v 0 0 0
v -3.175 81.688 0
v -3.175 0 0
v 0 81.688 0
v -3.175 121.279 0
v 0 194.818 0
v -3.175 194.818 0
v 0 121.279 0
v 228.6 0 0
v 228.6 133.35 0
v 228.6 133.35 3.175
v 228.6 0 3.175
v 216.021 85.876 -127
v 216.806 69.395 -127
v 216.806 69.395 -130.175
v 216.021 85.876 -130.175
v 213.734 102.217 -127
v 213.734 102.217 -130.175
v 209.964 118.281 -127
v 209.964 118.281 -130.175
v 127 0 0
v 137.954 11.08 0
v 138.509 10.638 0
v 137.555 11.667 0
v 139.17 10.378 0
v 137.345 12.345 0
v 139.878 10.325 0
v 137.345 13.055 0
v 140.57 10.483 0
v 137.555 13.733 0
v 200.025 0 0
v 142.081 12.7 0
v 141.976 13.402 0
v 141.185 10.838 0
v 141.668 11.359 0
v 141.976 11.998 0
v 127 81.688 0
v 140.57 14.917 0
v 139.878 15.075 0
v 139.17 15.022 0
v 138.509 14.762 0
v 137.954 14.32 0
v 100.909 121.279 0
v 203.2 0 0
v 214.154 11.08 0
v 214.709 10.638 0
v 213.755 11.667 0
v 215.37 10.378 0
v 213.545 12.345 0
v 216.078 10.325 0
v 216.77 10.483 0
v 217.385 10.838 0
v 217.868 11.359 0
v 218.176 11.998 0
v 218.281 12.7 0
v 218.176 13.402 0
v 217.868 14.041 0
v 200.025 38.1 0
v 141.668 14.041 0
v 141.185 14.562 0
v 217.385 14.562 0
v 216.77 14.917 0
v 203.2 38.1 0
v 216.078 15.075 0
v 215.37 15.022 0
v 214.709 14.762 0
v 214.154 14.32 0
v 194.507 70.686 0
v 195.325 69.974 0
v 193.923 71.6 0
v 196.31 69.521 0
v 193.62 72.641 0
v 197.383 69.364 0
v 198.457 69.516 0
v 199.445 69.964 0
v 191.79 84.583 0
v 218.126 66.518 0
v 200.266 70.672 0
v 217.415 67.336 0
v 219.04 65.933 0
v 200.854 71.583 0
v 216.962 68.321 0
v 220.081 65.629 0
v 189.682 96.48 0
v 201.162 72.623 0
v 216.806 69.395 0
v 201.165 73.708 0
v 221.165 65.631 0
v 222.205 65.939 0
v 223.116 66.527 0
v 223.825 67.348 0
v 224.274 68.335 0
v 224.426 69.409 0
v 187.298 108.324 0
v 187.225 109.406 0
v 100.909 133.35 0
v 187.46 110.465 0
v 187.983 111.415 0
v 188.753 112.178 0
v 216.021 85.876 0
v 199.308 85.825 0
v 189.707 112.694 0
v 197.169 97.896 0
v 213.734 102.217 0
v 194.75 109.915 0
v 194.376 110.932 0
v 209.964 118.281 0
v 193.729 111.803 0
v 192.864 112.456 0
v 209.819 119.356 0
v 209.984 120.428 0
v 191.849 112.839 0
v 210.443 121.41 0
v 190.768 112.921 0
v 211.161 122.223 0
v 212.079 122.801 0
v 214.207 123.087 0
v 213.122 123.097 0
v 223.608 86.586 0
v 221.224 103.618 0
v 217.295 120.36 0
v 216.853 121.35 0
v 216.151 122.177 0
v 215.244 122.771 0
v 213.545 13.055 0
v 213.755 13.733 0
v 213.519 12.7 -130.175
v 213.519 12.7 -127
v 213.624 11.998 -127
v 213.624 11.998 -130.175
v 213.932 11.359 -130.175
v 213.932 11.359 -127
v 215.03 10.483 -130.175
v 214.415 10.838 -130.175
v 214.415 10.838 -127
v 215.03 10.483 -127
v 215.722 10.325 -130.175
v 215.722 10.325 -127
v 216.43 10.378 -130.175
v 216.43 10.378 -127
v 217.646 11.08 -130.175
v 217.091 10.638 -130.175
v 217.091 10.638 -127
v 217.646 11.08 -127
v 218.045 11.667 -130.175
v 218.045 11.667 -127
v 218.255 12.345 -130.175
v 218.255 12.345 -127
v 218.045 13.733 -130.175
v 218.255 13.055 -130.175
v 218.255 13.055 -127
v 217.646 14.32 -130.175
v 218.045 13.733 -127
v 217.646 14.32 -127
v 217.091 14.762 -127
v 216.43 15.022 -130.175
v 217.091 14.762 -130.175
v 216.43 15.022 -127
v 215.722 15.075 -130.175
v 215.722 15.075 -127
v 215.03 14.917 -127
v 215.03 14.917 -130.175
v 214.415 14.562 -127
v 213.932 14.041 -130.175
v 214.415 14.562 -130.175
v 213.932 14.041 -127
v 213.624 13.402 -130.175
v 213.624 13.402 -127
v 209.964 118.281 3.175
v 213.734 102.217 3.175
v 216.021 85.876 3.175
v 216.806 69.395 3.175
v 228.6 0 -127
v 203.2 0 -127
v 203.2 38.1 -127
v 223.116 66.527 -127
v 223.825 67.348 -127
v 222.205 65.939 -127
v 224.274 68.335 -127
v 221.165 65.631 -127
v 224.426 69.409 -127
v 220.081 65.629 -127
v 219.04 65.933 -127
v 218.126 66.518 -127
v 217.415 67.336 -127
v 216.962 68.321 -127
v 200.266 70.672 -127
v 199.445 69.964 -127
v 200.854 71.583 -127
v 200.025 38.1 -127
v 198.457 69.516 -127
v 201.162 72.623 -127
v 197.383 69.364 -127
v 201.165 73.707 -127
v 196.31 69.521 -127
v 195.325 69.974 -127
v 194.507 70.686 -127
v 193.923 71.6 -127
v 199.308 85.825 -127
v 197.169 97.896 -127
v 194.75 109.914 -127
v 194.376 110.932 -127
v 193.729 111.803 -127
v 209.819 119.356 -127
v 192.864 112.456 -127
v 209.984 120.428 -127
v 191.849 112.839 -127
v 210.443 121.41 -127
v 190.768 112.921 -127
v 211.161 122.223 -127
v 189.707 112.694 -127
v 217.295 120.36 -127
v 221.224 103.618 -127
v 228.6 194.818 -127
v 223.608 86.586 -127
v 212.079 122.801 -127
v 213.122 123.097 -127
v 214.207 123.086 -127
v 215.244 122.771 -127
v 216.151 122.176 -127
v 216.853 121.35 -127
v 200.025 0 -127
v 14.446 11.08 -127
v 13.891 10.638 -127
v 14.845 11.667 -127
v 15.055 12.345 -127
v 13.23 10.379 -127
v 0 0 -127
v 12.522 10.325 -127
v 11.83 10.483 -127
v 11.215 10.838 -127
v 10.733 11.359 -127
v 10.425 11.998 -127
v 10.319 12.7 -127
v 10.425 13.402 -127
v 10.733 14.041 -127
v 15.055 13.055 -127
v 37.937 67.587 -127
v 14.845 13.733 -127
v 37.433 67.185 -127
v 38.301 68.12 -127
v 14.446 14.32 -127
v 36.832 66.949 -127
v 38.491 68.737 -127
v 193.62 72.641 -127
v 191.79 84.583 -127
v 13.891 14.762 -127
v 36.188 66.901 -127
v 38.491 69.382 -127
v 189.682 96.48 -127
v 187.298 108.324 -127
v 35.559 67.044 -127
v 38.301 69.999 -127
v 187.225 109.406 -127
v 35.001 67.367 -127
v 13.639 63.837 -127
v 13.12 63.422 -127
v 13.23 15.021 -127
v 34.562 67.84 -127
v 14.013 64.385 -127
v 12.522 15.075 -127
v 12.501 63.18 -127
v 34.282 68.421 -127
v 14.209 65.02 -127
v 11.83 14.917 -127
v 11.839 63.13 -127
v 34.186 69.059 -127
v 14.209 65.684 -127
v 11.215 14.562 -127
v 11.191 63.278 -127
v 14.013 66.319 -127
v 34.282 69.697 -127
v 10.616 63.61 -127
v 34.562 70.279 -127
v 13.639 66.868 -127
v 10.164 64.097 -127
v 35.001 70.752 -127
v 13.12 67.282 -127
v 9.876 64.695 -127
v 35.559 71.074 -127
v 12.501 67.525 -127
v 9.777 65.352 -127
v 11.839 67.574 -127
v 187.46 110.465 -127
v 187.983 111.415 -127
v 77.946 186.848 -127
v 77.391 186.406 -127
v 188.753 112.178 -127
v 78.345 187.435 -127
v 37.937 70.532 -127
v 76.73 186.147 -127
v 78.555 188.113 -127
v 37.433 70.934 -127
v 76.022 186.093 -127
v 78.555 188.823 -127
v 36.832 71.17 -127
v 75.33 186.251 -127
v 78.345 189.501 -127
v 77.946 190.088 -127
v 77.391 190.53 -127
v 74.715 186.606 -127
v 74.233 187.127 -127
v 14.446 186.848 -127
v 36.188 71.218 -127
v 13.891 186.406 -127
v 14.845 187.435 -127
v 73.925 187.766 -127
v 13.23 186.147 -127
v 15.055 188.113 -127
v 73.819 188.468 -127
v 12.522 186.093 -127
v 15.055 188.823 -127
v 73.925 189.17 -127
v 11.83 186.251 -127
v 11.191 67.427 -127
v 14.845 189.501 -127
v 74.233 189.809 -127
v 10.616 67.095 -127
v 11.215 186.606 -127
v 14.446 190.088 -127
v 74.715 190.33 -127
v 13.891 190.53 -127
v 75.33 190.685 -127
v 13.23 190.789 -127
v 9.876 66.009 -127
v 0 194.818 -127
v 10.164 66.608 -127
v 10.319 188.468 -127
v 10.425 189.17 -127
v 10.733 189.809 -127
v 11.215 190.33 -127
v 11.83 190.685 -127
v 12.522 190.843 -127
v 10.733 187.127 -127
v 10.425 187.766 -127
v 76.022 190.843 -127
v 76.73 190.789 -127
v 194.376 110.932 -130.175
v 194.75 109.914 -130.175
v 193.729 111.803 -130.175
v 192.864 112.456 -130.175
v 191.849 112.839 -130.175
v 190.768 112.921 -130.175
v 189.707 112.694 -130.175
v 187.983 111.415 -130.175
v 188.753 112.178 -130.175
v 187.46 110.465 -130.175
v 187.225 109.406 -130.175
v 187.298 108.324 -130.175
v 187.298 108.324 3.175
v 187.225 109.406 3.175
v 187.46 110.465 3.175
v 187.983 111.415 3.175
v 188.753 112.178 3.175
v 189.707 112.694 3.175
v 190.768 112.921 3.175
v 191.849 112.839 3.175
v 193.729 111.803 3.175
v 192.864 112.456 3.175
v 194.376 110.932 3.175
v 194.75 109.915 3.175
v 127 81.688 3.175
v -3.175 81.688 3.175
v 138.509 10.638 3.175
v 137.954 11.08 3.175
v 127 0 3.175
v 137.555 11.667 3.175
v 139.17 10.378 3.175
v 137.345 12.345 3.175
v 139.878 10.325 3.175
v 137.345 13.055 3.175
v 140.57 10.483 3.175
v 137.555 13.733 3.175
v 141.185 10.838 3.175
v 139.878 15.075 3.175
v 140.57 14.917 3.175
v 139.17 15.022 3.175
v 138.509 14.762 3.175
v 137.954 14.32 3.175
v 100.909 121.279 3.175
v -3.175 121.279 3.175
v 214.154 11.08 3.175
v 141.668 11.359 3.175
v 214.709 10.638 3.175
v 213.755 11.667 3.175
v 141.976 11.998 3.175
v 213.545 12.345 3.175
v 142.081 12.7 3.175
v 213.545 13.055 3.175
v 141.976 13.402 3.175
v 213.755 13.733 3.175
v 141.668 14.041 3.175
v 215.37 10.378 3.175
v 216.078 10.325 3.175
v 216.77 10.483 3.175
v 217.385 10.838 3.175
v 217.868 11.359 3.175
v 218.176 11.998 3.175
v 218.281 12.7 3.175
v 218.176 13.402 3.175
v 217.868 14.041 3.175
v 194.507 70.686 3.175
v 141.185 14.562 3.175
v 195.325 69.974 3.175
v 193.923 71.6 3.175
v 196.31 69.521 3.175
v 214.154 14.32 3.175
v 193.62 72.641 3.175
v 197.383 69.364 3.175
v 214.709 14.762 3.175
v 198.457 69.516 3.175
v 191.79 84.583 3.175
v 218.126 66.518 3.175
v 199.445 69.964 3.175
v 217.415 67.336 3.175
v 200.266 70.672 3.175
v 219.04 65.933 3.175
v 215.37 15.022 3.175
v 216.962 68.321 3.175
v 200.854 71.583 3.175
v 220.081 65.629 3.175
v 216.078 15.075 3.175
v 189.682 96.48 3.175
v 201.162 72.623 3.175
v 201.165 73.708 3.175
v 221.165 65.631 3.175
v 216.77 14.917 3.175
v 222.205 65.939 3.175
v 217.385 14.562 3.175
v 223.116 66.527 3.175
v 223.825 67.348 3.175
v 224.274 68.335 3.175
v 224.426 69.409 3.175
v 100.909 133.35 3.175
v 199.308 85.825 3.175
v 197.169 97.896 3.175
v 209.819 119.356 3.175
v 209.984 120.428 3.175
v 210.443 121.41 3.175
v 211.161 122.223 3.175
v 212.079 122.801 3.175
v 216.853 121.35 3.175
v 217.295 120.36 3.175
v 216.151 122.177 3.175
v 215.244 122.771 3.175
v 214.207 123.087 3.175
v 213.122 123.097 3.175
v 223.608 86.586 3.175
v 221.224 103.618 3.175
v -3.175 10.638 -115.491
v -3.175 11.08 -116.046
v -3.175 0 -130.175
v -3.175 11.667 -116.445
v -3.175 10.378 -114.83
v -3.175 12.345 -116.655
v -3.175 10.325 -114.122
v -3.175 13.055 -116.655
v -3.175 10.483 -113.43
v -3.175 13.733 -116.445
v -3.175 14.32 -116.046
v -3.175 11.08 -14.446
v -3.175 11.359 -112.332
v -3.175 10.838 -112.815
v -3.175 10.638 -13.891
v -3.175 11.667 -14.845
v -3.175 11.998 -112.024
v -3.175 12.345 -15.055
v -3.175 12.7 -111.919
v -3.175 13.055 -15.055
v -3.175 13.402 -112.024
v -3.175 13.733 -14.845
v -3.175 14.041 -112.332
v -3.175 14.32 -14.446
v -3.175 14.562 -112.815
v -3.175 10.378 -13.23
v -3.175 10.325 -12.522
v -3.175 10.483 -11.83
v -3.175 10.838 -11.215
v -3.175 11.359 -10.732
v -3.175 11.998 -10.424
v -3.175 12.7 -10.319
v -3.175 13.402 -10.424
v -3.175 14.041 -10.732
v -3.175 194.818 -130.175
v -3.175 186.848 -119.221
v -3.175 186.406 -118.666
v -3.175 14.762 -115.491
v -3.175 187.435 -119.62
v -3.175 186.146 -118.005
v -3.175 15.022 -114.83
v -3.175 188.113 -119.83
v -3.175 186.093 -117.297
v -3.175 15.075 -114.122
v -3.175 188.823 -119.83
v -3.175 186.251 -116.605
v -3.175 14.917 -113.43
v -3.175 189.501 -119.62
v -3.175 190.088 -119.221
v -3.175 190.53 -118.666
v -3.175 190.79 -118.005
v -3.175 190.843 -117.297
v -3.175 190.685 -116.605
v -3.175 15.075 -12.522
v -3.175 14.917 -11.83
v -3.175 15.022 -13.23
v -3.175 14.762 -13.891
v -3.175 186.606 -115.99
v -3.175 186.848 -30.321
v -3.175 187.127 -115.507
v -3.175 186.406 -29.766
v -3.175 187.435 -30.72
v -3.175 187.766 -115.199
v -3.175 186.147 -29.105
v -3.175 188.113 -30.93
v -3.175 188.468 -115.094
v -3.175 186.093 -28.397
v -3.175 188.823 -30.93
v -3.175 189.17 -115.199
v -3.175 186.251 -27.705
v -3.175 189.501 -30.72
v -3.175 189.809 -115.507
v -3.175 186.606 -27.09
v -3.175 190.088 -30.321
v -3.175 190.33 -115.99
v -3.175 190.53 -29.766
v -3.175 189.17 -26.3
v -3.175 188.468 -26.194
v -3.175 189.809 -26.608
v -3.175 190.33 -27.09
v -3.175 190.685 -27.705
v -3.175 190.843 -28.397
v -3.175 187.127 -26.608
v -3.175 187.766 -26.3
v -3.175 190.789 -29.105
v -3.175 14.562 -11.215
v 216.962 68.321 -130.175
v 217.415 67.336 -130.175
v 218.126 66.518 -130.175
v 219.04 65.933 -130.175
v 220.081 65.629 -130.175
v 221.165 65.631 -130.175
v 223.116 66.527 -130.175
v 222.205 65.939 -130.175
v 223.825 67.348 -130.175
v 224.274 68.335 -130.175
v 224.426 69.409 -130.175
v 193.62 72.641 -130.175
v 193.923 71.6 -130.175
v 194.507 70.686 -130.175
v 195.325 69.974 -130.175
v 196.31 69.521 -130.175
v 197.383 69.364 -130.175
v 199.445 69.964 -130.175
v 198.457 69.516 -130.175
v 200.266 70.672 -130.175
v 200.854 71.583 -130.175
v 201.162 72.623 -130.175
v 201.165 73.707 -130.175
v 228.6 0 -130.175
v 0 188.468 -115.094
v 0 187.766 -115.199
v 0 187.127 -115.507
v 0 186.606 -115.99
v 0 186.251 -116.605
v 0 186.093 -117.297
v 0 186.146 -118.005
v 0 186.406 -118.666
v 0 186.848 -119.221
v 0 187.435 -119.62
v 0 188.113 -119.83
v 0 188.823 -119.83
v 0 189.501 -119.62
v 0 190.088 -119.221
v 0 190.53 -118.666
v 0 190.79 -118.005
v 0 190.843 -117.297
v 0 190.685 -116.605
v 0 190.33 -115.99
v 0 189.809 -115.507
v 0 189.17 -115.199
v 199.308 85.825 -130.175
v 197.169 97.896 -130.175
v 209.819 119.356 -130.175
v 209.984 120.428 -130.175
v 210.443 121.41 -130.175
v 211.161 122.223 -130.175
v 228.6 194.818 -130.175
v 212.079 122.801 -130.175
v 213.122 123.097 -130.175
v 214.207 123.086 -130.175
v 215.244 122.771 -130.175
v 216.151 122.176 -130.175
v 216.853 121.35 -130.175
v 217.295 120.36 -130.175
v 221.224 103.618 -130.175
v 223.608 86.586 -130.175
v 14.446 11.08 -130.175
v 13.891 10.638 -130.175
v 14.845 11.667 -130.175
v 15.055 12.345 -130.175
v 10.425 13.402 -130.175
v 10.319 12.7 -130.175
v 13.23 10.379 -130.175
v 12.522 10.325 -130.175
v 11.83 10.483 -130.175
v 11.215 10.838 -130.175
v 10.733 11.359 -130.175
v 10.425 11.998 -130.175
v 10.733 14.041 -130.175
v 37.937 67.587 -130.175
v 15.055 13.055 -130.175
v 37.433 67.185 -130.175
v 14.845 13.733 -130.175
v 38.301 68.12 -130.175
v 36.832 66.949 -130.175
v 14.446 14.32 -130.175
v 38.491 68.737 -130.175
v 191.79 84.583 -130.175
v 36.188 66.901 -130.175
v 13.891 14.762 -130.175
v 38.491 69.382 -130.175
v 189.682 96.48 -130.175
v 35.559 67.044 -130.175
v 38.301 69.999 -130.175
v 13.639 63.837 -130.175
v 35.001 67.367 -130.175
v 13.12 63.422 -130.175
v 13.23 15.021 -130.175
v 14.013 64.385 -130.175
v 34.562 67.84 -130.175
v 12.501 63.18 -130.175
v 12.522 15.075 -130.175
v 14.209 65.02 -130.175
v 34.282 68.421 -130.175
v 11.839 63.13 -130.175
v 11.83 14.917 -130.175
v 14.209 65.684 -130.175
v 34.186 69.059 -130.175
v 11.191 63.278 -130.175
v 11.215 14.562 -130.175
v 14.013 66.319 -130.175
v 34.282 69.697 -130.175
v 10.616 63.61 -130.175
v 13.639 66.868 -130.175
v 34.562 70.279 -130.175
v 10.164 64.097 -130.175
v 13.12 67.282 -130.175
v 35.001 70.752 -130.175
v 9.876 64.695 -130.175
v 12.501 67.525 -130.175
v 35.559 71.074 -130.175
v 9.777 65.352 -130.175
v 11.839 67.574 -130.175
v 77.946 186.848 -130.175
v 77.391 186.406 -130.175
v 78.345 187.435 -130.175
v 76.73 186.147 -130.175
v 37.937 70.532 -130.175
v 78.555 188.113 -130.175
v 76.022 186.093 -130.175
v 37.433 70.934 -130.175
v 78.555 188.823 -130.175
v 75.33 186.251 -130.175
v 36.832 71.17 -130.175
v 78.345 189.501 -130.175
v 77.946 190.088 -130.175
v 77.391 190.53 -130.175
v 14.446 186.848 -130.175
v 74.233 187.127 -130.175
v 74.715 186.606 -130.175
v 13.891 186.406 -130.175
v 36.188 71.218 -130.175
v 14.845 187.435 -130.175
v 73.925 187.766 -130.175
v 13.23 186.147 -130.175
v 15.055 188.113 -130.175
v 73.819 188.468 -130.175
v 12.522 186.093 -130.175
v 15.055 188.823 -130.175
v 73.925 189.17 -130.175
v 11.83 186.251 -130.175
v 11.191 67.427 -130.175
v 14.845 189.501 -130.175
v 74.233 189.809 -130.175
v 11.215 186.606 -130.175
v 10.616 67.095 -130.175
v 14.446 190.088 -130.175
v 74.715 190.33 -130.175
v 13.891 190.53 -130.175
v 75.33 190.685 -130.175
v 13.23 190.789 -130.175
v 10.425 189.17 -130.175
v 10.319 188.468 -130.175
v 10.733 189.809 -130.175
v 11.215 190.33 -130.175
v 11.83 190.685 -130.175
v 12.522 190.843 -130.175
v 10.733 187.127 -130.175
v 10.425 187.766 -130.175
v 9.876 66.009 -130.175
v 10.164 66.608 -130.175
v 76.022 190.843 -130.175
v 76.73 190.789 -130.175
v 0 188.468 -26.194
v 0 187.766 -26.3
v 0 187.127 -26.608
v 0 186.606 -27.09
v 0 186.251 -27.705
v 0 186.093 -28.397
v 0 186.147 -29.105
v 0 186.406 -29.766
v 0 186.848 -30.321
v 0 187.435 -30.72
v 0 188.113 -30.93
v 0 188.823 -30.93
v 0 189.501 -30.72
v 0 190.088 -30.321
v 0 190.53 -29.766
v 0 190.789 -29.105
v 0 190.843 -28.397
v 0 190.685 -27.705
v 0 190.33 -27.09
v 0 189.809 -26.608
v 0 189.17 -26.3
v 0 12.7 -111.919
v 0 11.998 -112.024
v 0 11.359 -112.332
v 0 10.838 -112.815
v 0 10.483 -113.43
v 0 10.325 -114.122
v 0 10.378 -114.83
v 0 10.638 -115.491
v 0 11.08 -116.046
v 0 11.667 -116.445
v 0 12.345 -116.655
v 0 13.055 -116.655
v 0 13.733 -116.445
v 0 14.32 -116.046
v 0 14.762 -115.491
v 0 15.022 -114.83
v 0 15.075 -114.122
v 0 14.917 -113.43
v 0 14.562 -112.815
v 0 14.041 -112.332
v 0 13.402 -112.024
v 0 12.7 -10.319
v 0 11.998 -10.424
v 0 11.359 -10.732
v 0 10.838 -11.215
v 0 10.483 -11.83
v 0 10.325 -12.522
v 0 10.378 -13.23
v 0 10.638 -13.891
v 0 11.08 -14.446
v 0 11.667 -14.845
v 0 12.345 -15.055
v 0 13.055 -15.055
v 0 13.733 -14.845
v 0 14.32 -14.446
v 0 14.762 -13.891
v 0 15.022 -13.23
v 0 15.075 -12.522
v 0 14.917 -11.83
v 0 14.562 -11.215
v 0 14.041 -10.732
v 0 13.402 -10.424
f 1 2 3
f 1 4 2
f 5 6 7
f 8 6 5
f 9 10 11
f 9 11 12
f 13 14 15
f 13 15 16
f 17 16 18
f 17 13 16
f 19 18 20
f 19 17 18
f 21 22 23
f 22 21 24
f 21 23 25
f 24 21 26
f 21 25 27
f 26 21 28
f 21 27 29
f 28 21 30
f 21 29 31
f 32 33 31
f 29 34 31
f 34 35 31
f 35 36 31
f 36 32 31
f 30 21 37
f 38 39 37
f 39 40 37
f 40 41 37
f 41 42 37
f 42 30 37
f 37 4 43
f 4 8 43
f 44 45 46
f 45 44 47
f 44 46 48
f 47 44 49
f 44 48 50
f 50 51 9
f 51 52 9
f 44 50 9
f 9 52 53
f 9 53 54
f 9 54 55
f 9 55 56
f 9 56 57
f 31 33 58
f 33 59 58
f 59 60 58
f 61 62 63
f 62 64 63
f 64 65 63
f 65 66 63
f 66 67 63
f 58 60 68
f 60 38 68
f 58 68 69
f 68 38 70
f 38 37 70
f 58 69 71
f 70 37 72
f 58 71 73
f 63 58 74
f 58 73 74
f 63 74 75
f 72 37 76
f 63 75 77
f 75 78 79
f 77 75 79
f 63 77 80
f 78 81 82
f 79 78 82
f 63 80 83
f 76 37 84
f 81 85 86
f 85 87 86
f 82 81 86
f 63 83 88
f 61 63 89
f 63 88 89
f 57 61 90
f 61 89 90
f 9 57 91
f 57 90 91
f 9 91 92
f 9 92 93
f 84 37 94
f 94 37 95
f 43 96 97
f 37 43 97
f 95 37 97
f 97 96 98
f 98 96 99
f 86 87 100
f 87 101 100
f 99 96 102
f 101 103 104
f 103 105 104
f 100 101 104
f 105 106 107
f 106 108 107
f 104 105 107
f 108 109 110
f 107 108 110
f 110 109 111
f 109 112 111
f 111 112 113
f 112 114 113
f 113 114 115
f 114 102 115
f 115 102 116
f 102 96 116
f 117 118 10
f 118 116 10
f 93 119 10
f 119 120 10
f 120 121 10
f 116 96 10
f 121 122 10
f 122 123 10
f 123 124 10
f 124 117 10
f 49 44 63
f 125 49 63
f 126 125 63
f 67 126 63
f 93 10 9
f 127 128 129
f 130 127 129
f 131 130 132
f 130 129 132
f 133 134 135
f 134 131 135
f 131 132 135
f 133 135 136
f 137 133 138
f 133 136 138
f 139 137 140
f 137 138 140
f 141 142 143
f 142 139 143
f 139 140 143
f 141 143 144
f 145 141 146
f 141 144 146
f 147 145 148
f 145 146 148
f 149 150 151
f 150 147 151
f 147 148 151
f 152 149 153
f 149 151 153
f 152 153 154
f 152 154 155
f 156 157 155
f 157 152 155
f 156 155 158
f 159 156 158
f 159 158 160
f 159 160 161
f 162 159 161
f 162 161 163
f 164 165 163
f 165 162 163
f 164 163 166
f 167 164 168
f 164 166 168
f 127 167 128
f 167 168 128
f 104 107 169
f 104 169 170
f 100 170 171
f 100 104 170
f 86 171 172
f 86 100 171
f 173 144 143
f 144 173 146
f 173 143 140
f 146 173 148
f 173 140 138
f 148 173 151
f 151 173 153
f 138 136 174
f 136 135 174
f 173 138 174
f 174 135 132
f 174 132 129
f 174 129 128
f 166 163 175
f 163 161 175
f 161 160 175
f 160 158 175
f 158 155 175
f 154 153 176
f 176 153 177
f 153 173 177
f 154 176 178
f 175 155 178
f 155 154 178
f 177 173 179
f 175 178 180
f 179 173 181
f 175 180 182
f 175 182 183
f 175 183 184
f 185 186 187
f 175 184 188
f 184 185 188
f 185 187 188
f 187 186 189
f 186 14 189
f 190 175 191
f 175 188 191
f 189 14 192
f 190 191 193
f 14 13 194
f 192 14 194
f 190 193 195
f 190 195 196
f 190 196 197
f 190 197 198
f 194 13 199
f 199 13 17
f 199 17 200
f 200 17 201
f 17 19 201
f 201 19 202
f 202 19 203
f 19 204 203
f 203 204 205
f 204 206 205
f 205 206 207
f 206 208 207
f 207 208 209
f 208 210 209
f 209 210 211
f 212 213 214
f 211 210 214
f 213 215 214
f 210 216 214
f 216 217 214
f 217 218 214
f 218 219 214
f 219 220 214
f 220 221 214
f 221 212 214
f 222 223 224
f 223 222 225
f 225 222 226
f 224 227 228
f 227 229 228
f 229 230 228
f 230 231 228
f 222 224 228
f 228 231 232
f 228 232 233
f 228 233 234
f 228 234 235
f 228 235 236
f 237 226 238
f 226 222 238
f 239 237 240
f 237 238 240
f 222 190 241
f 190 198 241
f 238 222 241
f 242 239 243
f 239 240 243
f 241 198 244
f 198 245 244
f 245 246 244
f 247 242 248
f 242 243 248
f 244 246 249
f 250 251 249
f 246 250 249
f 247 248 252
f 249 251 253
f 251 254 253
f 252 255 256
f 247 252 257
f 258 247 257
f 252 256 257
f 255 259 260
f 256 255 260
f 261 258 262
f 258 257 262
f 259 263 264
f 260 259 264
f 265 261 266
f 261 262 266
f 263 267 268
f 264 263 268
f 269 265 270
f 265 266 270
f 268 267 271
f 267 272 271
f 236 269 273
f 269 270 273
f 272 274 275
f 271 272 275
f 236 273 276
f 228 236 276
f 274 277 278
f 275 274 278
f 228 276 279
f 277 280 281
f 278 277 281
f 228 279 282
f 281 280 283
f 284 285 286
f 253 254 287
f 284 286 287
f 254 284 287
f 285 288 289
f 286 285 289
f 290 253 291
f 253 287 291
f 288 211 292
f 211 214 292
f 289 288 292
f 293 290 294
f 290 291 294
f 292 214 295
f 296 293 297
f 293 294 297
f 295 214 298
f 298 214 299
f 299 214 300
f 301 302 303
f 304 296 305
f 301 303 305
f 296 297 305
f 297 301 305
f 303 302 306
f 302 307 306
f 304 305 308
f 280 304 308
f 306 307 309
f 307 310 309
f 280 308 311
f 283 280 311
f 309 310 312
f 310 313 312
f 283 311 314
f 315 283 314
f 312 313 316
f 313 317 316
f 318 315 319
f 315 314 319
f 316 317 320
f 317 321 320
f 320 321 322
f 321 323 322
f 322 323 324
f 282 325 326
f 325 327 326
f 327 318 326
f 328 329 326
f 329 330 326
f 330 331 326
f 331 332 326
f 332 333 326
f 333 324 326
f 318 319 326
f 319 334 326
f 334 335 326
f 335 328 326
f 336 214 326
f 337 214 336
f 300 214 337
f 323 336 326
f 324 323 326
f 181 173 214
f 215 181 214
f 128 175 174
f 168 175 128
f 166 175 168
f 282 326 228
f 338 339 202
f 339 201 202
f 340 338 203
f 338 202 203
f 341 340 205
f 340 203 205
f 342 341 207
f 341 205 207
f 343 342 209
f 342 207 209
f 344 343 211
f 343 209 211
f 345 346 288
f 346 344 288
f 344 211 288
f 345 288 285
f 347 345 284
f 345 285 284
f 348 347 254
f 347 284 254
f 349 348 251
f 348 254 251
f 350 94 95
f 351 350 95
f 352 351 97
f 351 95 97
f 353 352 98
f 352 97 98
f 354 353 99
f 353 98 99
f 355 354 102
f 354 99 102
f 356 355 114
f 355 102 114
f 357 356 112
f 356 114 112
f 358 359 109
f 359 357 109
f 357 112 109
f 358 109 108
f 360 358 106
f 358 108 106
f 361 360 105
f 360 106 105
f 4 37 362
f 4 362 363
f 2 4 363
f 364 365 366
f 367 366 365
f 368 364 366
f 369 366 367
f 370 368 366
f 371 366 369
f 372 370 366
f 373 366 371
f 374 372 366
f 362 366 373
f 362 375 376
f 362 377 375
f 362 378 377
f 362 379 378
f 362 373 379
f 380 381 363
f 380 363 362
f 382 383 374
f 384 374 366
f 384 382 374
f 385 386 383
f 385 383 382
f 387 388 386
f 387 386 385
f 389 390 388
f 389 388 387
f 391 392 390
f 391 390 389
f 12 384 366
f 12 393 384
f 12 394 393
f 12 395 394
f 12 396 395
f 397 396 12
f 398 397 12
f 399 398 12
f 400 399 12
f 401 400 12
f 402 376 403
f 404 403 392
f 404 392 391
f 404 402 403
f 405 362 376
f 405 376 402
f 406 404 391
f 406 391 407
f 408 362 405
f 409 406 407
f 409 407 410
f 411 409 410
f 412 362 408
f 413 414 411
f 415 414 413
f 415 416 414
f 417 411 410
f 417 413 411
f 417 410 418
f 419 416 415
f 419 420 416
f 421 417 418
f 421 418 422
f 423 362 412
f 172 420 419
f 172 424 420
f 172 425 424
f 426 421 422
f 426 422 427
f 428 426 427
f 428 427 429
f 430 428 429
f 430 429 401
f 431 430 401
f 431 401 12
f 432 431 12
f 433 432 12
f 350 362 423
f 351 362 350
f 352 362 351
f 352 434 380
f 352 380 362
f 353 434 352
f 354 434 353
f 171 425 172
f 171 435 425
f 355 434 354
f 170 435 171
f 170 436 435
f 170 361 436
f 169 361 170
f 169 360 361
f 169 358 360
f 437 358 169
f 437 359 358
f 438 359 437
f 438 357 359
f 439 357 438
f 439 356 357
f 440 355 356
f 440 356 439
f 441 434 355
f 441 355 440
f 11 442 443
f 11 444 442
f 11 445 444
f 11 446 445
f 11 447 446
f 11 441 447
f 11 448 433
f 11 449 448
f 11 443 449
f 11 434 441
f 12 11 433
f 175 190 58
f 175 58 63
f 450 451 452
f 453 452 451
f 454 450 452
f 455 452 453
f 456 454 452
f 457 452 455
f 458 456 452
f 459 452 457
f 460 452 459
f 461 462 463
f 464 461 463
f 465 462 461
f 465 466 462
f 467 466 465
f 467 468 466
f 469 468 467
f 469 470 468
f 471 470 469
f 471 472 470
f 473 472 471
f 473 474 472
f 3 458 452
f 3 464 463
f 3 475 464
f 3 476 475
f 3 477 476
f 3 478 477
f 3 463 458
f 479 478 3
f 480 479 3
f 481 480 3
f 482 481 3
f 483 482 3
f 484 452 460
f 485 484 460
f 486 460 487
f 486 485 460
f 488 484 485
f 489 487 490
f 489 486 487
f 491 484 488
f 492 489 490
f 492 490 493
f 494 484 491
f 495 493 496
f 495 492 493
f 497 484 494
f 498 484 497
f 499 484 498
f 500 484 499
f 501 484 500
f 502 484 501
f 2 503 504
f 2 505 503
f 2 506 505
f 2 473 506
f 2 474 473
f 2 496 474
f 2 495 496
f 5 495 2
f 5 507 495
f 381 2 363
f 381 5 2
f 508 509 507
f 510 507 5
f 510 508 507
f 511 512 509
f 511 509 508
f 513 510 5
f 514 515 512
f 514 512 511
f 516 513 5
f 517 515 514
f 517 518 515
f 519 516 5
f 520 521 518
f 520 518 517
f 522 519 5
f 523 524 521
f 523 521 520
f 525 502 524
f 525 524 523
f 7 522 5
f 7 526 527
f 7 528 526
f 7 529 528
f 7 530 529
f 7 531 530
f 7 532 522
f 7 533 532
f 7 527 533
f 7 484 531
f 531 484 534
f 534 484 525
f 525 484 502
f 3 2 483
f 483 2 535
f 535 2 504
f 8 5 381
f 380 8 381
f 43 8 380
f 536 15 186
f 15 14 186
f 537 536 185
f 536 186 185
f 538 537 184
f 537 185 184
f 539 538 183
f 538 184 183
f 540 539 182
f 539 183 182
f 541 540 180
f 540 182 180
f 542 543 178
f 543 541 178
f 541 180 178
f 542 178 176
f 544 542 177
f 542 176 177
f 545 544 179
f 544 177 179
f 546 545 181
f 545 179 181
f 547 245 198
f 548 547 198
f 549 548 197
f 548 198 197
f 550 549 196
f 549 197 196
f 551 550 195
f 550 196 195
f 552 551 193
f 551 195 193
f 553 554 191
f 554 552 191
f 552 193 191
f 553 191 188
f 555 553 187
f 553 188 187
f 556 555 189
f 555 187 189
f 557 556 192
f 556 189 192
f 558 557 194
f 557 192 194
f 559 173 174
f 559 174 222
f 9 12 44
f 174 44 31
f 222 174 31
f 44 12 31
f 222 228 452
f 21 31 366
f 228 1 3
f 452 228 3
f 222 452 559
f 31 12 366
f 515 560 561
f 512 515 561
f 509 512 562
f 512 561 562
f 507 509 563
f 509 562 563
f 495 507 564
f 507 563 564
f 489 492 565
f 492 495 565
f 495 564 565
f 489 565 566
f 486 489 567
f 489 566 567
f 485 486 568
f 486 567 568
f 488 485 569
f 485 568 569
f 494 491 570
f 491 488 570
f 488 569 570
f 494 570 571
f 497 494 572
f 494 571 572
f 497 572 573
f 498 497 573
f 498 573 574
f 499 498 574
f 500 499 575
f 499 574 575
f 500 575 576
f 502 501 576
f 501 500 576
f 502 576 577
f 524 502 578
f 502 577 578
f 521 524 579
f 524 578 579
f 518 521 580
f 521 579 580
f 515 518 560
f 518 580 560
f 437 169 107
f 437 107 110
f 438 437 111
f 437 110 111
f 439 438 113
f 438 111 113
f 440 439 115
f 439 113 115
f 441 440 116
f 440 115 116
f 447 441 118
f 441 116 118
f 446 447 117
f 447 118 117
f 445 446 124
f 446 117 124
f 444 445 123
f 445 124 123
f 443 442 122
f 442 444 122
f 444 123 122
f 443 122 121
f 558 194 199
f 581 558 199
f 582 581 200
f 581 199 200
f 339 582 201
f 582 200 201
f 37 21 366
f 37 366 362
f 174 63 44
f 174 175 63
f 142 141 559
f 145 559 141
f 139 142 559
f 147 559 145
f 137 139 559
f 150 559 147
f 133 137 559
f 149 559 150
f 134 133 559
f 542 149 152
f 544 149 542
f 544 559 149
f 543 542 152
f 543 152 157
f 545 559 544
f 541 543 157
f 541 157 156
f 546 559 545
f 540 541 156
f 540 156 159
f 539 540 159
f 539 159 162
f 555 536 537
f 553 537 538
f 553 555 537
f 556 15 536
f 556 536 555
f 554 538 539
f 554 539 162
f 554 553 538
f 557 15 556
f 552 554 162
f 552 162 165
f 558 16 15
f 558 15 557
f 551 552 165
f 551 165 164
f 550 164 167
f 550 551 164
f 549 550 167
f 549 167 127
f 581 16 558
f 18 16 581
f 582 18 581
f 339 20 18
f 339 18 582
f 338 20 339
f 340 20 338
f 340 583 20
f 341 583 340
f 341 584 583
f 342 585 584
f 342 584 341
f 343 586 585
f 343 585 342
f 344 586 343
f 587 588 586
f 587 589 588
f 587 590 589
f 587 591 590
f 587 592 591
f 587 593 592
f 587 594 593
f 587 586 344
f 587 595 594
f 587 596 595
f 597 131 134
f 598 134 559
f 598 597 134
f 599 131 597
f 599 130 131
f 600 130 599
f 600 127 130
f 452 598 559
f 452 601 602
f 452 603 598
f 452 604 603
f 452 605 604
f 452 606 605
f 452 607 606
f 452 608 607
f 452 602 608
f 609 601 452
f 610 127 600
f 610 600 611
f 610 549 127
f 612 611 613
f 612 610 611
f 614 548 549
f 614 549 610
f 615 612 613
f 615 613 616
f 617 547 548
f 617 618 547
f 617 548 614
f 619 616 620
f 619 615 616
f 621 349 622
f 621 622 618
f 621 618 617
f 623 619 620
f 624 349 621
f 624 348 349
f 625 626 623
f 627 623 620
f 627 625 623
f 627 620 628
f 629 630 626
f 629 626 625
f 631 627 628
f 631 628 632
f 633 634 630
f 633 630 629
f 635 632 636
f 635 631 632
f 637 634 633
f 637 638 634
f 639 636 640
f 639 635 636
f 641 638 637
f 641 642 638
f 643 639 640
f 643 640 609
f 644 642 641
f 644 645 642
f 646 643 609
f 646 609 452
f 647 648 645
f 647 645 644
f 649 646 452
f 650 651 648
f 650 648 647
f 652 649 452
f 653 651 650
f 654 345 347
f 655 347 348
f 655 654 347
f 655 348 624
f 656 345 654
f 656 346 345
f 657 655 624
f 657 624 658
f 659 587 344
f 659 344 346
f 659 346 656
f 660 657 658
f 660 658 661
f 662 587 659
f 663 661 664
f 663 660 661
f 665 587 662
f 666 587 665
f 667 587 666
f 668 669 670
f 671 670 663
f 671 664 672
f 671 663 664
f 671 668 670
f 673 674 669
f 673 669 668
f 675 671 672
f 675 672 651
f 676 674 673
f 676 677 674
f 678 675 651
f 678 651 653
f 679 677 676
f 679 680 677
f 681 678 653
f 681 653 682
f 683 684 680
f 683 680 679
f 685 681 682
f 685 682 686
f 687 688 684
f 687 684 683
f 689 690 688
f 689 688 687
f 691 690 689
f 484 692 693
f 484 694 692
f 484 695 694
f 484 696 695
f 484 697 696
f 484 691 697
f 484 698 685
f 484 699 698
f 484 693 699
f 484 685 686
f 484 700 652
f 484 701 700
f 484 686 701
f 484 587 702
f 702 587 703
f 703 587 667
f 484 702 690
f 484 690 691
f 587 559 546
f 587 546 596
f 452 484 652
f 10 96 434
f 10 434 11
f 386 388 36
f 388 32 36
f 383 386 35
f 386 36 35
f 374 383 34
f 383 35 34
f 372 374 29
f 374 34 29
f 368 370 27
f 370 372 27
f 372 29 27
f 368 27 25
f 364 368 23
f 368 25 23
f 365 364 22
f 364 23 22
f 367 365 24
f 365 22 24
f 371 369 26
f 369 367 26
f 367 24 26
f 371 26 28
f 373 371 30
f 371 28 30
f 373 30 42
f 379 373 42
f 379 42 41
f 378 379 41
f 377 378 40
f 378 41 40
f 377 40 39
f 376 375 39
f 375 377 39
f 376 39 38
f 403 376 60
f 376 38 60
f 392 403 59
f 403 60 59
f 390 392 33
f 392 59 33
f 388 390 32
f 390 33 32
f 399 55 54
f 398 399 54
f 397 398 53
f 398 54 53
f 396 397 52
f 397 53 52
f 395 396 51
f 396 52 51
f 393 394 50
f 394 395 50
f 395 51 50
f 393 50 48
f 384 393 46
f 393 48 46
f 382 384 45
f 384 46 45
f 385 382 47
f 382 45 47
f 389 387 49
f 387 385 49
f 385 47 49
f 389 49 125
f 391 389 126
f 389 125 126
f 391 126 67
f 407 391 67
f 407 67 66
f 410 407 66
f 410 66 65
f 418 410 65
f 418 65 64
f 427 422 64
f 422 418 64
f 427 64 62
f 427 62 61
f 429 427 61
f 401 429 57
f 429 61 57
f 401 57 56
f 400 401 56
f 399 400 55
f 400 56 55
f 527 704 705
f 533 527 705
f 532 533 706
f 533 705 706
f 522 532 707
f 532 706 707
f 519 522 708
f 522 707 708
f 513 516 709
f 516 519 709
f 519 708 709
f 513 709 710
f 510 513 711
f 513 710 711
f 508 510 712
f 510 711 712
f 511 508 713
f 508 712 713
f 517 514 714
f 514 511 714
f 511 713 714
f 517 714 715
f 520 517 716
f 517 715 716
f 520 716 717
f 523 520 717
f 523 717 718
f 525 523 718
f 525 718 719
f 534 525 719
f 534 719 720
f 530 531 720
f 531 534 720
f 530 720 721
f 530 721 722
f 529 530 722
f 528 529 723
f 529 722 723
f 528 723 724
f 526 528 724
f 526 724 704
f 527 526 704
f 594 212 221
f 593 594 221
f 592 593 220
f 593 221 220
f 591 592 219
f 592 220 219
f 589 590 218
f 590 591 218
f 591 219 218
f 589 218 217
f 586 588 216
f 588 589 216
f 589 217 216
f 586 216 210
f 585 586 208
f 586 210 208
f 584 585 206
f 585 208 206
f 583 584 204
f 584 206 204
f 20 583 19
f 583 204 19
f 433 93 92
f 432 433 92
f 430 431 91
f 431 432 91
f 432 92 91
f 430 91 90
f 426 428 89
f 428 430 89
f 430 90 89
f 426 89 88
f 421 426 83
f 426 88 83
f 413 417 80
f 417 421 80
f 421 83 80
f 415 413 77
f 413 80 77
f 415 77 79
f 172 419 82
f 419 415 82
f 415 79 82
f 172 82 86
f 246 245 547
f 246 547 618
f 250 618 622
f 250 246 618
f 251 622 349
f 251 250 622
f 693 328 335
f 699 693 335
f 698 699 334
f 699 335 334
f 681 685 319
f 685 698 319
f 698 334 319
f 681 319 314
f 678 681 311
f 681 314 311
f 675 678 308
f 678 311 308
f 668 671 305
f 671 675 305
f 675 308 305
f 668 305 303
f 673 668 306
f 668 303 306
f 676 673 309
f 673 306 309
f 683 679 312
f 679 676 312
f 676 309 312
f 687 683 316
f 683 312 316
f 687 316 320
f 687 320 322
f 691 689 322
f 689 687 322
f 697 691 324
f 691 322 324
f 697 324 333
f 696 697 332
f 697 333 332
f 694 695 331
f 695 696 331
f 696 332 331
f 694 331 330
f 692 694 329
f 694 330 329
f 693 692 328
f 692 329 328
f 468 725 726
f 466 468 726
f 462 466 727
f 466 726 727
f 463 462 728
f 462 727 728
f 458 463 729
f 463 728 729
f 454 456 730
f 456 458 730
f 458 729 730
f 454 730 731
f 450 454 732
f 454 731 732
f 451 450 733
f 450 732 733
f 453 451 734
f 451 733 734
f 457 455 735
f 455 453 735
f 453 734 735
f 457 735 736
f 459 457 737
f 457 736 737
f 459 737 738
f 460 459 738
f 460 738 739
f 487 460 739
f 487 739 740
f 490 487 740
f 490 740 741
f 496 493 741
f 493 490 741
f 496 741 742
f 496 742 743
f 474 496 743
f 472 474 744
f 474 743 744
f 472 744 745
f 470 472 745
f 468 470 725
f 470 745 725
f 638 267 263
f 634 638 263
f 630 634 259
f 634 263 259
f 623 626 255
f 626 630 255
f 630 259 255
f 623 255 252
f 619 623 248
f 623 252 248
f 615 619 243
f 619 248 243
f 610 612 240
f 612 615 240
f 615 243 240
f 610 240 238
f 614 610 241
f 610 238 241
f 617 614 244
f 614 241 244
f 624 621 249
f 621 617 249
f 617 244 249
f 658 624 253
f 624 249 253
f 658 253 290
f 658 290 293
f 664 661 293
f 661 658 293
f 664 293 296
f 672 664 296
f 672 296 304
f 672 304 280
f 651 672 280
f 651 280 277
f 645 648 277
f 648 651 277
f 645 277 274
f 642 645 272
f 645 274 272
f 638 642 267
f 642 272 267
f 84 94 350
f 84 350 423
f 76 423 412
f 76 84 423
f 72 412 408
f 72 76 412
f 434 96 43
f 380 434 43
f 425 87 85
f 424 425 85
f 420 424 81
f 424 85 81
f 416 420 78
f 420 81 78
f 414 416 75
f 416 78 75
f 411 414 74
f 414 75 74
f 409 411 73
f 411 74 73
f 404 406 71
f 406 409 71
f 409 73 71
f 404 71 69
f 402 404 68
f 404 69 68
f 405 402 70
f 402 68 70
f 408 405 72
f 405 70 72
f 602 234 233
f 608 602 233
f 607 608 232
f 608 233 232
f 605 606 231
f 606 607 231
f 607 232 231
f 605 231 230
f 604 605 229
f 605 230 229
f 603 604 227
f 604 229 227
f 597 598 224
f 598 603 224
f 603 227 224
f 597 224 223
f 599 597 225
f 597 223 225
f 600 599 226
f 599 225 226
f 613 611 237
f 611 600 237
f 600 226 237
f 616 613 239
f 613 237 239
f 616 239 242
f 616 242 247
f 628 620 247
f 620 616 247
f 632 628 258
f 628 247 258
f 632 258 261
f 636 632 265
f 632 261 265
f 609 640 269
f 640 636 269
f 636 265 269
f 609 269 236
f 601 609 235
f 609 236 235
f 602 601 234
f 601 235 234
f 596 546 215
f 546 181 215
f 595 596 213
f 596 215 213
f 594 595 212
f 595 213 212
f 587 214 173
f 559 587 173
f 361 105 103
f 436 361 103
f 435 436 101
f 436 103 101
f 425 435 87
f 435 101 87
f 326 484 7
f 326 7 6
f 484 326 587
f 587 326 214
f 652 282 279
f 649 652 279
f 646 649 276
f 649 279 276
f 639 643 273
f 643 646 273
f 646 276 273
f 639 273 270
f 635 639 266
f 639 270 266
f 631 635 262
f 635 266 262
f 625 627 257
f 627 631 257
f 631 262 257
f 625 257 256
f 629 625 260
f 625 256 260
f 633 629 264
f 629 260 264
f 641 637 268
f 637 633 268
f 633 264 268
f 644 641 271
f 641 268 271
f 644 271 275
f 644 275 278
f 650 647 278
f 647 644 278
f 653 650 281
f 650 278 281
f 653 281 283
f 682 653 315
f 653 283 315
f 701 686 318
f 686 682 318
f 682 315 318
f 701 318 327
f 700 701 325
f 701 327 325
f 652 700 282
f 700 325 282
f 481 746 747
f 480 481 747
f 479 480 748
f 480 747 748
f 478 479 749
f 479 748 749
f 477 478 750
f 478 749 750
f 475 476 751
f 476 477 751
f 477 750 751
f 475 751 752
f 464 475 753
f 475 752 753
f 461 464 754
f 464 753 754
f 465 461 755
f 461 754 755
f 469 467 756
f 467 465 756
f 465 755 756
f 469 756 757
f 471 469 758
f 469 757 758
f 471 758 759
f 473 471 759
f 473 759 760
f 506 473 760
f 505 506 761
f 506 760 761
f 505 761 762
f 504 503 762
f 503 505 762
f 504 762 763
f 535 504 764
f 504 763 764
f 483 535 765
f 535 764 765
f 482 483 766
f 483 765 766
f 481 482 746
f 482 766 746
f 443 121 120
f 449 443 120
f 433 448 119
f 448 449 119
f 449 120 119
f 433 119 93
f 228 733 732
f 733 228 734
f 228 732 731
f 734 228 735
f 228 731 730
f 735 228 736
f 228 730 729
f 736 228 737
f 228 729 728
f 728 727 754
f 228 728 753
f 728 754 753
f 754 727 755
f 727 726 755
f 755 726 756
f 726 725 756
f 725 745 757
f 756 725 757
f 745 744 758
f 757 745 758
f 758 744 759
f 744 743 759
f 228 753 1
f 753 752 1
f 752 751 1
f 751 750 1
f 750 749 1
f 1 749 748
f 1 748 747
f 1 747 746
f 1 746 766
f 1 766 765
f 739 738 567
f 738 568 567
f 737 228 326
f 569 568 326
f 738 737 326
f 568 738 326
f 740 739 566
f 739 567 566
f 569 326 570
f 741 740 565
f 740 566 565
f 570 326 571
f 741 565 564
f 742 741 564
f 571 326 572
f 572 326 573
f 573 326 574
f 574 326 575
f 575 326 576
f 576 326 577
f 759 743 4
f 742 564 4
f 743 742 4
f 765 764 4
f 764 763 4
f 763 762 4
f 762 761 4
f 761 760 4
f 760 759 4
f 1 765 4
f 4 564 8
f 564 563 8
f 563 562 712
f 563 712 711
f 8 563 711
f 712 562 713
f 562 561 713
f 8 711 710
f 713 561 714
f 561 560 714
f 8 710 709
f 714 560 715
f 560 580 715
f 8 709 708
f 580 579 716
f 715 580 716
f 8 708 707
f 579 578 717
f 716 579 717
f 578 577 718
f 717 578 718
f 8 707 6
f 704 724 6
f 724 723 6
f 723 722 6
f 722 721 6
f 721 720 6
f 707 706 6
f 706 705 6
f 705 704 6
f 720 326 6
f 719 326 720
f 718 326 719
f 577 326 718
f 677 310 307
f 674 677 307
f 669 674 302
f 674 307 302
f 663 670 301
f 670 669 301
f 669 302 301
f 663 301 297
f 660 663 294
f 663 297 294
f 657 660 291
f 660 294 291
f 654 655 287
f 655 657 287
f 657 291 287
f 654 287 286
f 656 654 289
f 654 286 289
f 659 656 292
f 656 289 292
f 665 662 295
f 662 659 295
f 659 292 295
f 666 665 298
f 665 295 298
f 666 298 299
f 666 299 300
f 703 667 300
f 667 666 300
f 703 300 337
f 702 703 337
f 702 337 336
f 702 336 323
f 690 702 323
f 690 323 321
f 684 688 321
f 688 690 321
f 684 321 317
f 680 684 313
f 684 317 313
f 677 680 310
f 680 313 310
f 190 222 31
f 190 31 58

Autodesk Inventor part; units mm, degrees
ref_plane "YZ Plane" through (0, 0, 0) normal (1, 0, 0) x (0, 1, 0)
ref_plane "XZ Plane" through (0, 0, 0) normal (0, 1, 0) x (-1, 0, 0)
ref_plane "XY Plane" through (0, 0, 0) normal (0, 0, 1) x (1, 0, 0)
ref_plane "Work Plane1" through (228.6, 0, -127) normal (0, 0, -1) x (-1, 0, 0)
sketch "Sketch5" plane through (228.6, 0, -127) normal (0, 0, -1) x (-1, 0, 0)
  line L0 (0, 0) -> (228.6, 0)
  line L1 (228.6, 0) -> (228.6, 194.818)
  line L2 (228.6, 194.818) -> (0, 194.818)
  line L3 (0, 194.818) -> (0, 0)
  circle A0 centre (549.0601, -0.0332) radius 2.1647 construction
  circle A1 centre (192.2498, 69.0594) radius 2.1647 construction
  arc A2 (37.5756, 109.1194) -> (31.2075, 73.1741) centre (549.0601, -0.0332) ccw construction
  arc A3 (33.8495, 109.9145) -> (27.435, 73.7074) centre (549.0601, -0.0332) ccw
  arc A4 (41.3017, 108.3242) -> (34.98, 72.6408) centre (549.0601, -0.0332) ccw
  arc A5 (41.3017, 108.3242) -> (33.8495, 109.9145) centre (37.5756, 109.1194) ccw
  arc A6 (27.435, 73.7074) -> (34.98, 72.6408) centre (31.2075, 73.1741) ccw
  line L4 (549.0601, -0.0332) -> (37.5756, 109.1194) construction
  line L5 (549.0601, -0.0332) -> (31.2075, 73.1741) construction
  arc A7 (14.9709, 119.3205) -> (7.984, 69.4017) centre (192.2498, 69.0594) ccw construction
  arc A8 (11.3053, 120.3597) -> (4.174, 69.4087) centre (192.2498, 69.0594) ccw
  arc A9 (18.6364, 118.2812) -> (11.794, 69.3946) centre (192.2498, 69.0594) ccw
  arc A10 (18.6364, 118.2812) -> (11.3053, 120.3597) centre (14.9709, 119.3205) ccw
  arc A11 (4.174, 69.4087) -> (11.794, 69.3946) centre (7.984, 69.4017) ccw
  circle A12 centre (192.2498, 69.0594) radius 2.1647
  circle A13 centre (216.5947, 65.3523) radius 2.2284
  line L6 (0, 0) -> (25.4, 0) construction
  line L7 (25.4, 0) -> (25.4, 25.4) construction
  line L8 (25.4, 25.4) -> (0, 25.4) construction
  line L9 (0, 25.4) -> (0, 0) construction
  line L10 (228.6, 0) -> (203.2, 0) construction
  line L11 (203.2, 0) -> (203.2, 25.4) construction
  line L12 (203.2, 25.4) -> (228.6, 25.4) construction
  line L13 (228.6, 25.4) -> (228.6, 0) construction
  line L14 (25.4, 25.4) -> (0, 0) construction
  line L15 (0, 25.4) -> (25.4, 0) construction
  line L16 (203.2, 25.4) -> (228.6, 0) construction
  line L17 (228.6, 25.4) -> (203.2, 0) construction
  circle A14 centre (12.7, 12.7) radius 2.3813
  circle A15 centre (215.9, 12.7) radius 2.3812
  line L18 (228.6, 194.818) -> (222.25, 194.818) construction
  line L19 (222.25, 194.818) -> (222.25, 169.418) construction
  line L20 (222.25, 169.418) -> (228.6, 169.418) construction
  line L21 (228.6, 169.418) -> (228.6, 194.818) construction
  line L22 (222.25, 194.818) -> (196.85, 194.818) construction
  line L23 (222.25, 169.418) -> (222.25, 194.818) construction
  line L24 (196.85, 194.818) -> (107.95, 194.818) construction
  line L25 (107.95, 194.818) -> (133.35, 194.818) construction
  line L26 (222.25, 194.818) -> (209.55, 194.818) construction
  line L27 (209.55, 194.818) -> (209.55, 182.118) construction
  line L28 (209.55, 182.118) -> (222.25, 182.118) construction
  line L29 (222.25, 182.118) -> (222.25, 194.818) construction
  line L30 (209.55, 194.818) -> (146.05, 194.818) construction
  line L31 (146.05, 194.818) -> (158.75, 194.818) construction
  line L32 (158.75, 194.818) -> (158.75, 182.118) construction
  line L33 (158.75, 182.118) -> (146.05, 182.118) construction
  line L34 (146.05, 182.118) -> (146.05, 194.818) construction
  line L35 (222.25, 194.818) -> (209.55, 182.118) construction
  line L36 (209.55, 194.818) -> (222.25, 182.118) construction
  line L37 (158.75, 194.818) -> (146.05, 182.118) construction
  line L38 (158.75, 182.118) -> (146.05, 194.818) construction
  circle A16 centre (215.9, 188.468) radius 2.3812
  circle A17 centre (152.4, 188.468) radius 2.3812
  dimension "d16" = 228.6
  dimension "d17" = 194.818
  dimension "d38" = 4
  dimension "d39" = 7.62
  dimension "d40" = 7.62
  dimension "d43" = 25.4
  dimension "d44" = 25.4
  dimension "d45" = 25.4
  dimension "d46" = 25.4
  dimension "d47" = 4.7625
  dimension "d48" = 4.7625
  dimension "d61" = 6.35
  dimension "d70" = 12.7
  dimension "d71" = 12.7
  dimension "d72" = 63.5
  dimension "d73" = 12.7
  dimension "d74" = 12.7
  dimension "d75" = 4.7625
  dimension "d76" = 4.7625
extrude "Extrusion5" add sketch "Sketch5" along normal blind 3.175
ref_plane "Work Plane2" through (0, 0.0003, -127) normal (-1, 0, 0) x (0, 0, 1)
sketch "Sketch6" plane through (0, 0.0003, -127) normal (-1, 0, 0) x (0, 0, 1)
  line L0 (-3.175, -0.0003) -> (-3.175, 194.8177) projected
  line L1 (-3.175, 194.8177) -> (127, 194.8177)
  line L2 (127, 194.8177) -> (127, -0.0003)
  line L3 (127, -0.0003) -> (-3.175, -0.0003)
  line L4 (-3.175, -0.0003) -> (-3.175, 194.8177)
  line L5 (0, -0.0003) -> (0, 194.8177) construction
  line L6 (0, -0.0003) -> (25.4, -0.0003) construction
  line L7 (25.4, -0.0003) -> (25.4, 25.3997) construction
  line L8 (25.4, 25.3997) -> (0, 25.3997) construction
  line L9 (0, 25.3997) -> (0, -0.0003) construction
  line L10 (127, -0.0003) -> (101.6, -0.0003) construction
  line L11 (101.6, -0.0003) -> (101.6, 25.3997) construction
  line L12 (101.6, 25.3997) -> (127, 25.3997) construction
  line L13 (127, 25.3997) -> (127, -0.0003) construction
  line L14 (0, -0.0003) -> (25.4, 25.3997) construction
  line L15 (0, 25.3997) -> (25.4, -0.0003) construction
  line L16 (101.6, -0.0003) -> (127, 25.3997) construction
  line L17 (101.6, 25.3997) -> (127, -0.0003) construction
  circle A0 centre (12.7, 12.6997) radius 2.3813
  circle A1 centre (114.3, 12.6997) radius 2.3813
  line L18 (0, 194.8177) -> (3.175, 194.8177) construction
  line L19 (3.175, 194.8177) -> (3.175, 169.4177) construction
  line L20 (3.175, 169.4177) -> (0, 169.4177) construction
  line L21 (0, 169.4177) -> (0, 194.8177) construction
  line L22 (3.175, 194.8177) -> (15.875, 194.8177) construction
  line L23 (15.875, 194.8177) -> (15.875, 182.1177) construction
  line L24 (15.875, 182.1177) -> (3.175, 182.1177) construction
  line L25 (3.175, 182.1177) -> (3.175, 194.8177) construction
  line L26 (15.875, 194.8177) -> (104.775, 194.8177) construction
  line L27 (104.775, 194.8177) -> (92.075, 194.8177) construction
  line L28 (92.075, 194.8177) -> (92.075, 182.1177) construction
  line L29 (92.075, 182.1177) -> (104.775, 182.1177) construction
  line L30 (104.775, 182.1177) -> (104.775, 194.8177) construction
  line L31 (3.175, 194.8177) -> (15.875, 182.1177) construction
  line L32 (3.175, 182.1177) -> (15.875, 194.8177) construction
  line L33 (92.075, 194.8177) -> (104.775, 182.1177) construction
  line L34 (104.775, 194.8177) -> (92.075, 182.1177) construction
  circle A2 centre (98.425, 188.4677) radius 2.3812
  circle A3 centre (9.525, 188.4677) radius 2.3813
  point P0 (-3.175, -0.0003)
  dimension "d49" = 25.4
  dimension "d50" = 25.4
  dimension "d51" = 25.4
  dimension "d52" = 25.4
  dimension "d53" = 4.7625
  dimension "d54" = 4.7625
  dimension "d77" = 3.175
  dimension "d78" = 25.4
  dimension "d79" = 12.7
  dimension "d80" = 12.7
  dimension "d81" = 88.9
  dimension "d82" = 12.7
  dimension "d83" = 12.7
  dimension "d84" = 4.7625
  dimension "d85" = 4.7625
extrude "Extrusion6" add sketch "Sketch6" along normal blind 3.175
ref_plane "Work Plane4" through (0, 0.0003, 0) normal (0, 0, 1) x (1, 0, 0)
sketch "Sketch7" plane through (0, 0.0003, 0) normal (0, 0, 1) x (1, 0, 0)
  line L0 (228.6, -0.0003) -> (228.6, 0) projected
  line L1 (228.6, -0.0003) -> (127, -0.0003)
  line L2 (127, -0.0003) -> (127, 194.8177)
  line L3 (127, 194.8177) -> (228.6, 194.8177)
  line L4 (228.6, 194.8177) -> (228.6, -0.0003)
  line L5 (228.6, -0.0003) -> (-3.175, -0.0003) projected
  line L6 (228.6, -0.0003) -> (127, -0.0003)
  line L7 (127, -0.0003) -> (127, 133.3497)
  line L8 (127, 133.3497) -> (228.6, 133.3497)
  line L9 (228.6, 133.3497) -> (228.6, -0.0003)
  arc A0 (217.2947, 120.3594) -> (209.9636, 118.281) centre (213.6291, 119.3202) ccw projected
  arc A1 (216.806, 69.3943) -> (209.9636, 118.281) centre (36.3502, 69.0591) ccw projected
  arc A2 (224.426, 69.4085) -> (217.2947, 120.3594) centre (36.3502, 69.0591) ccw projected
  arc A3 (216.806, 69.3943) -> (224.426, 69.4085) centre (220.616, 69.4014) ccw projected
  arc A4 (194.7505, 109.9143) -> (187.2983, 108.324) centre (191.0244, 109.1191) ccw projected
  arc A5 (193.62, 72.6406) -> (187.2983, 108.324) centre (-320.4601, -0.0334) ccw projected
  arc A6 (201.165, 73.7072) -> (194.7505, 109.9143) centre (-320.4601, -0.0334) ccw projected
  arc A7 (193.62, 72.6406) -> (201.165, 73.7072) centre (197.3925, 73.1739) ccw projected
  line L10 (127, -0.0003) -> (152.4, -0.0003) construction
  line L11 (152.4, -0.0003) -> (152.4, 25.3997) construction
  line L12 (152.4, 25.3997) -> (127, 25.3997) construction
  line L13 (127, 25.3997) -> (127, -0.0003) construction
  line L14 (228.6, 194.8177) -> (228.6, -0.0003) construction
  line L15 (228.6, -0.0003) -> (203.2, -0.0003) construction
  line L16 (203.2, -0.0003) -> (203.2, 25.3997) construction
  line L17 (203.2, 25.3997) -> (228.6, 25.3997) construction
  line L18 (228.6, 25.3997) -> (228.6, -0.0003) construction
  line L19 (127, 25.3997) -> (152.4, -0.0003) construction
  line L20 (152.4, 25.3997) -> (127, -0.0003) construction
  line L21 (228.6, -0.0003) -> (-3.175, -0.0003) construction
  line L22 (203.2, 25.3997) -> (228.6, -0.0003) construction
  line L23 (228.6, -0.0003) -> (228.6, 25.3997) construction
  line L24 (228.6, 25.3997) -> (203.2, -0.0003) construction
  circle A8 centre (139.7, 12.6997) radius 2.3813
  circle A9 centre (215.9, 12.6997) radius 2.3813
  line L25 (0, -0.0003) -> (0, 194.8177) projected
  line L26 (0, 121.2789) -> (127, 121.2789)
  line L27 (127, 121.2789) -> (127, 104.7109)
  line L28 (0, 104.7109) -> (0, 121.2789)
  line L29 (127, 133.3497) -> (100.9092, 133.3497)
  line L30 (100.9092, 133.3497) -> (100.9092, 121.2789)
  line L31 (100.9092, 121.2789) -> (127, 121.2789)
  line L32 (127, 121.2789) -> (127, 133.3497)
  line L33 (0, 121.2789) -> (127, 121.2789)
  line L34 (127, 121.2789) -> (127, 81.6877)
  line L35 (127, 81.6877) -> (0, 81.6877)
  line L36 (0, 81.6877) -> (0, 121.2789)
  line L37 (0, 121.2789) -> (-3.175, 121.2789)
  line L38 (-3.175, 121.2789) -> (-3.175, 81.6877)
  line L39 (-3.175, 81.6877) -> (0, 81.6877)
  line L40 (0, 81.6877) -> (0, 121.2789)
  point P0 (127, 133.3497)
  dimension "d22" = 101.6
  dimension "d23" = 194.818
  dimension "d26" = 101.6
  dimension "d27" = 133.35
  dimension "d55" = 25.4
  dimension "d56" = 25.4
  dimension "d57" = 25.4
  dimension "d58" = 25.4
  dimension "d59" = 4.7625
  dimension "d60" = 4.7625
extrude "Extrusion7" add sketch "Sketch7" along normal blind 3.175 contours L1 L2 L8 L4 | L35 L25 L26 L2 | L2 L26 L30 L29 | L39 L38 L37 L25
ref_plane "Work Plane3" through (0, 0.0003, 0) normal (0, 0, 1) x (1, 0, 0)
sketch "Sketch8" plane through (0, 0.0003, 0) normal (0, 0, 1) x (1, 0, 0)
  line L0 (18.6832, 91.7066) -> (0, 110.3898)
  line L1 (0, 0) -> (0, 194.8177) projected
  line L2 (18.6832, 91.7066) -> (45.1053, 91.7066) construction
  line L3 (0, 110.3898) -> (0, 113.5648) construction
  line L4 (0, 113.5648) -> (21.8582, 91.7066)
  line L5 (0, 113.5648) -> (0, 110.3898) construction
  line L6 (18.6832, 91.7066) -> (21.8582, 91.7066) construction
  line L7 (18.6832, 91.7066) -> (21.8582, 91.7066)
  line L8 (0, 113.5648) -> (0, 110.3898)
  line L9 (18.6832, 91.7066) -> (16.4382, 93.9517)
  line L10 (18.6832, 91.7066) -> (21.8582, 91.7066) construction
  line L11 (18.6832, 91.7066) -> (0, 91.7066)
  line L12 (18.6832, 91.7066) -> (37.3664, 91.7066) construction
  line L13 (0, 91.7066) -> (0, 94.8816)
  line L14 (0, 94.8816) -> (15.5082, 94.8816)
  point P0 (0, -0.0003)
  dimension "d28" = 135
  dimension "d29" = 3.175
  dimension "d30" = 45
  dimension "d31" = 3.175
  dimension "d32" = 135
  dimension "d33" = 180
  dimension "d34" = 3.175
  dimension "d35" = 90
extrude "Extrusion8" [suppressed]
sketch "Sketch10" plane through (228.6, 0, -127) normal (0, 0, 1) x (1, 0, 0)
  line L0 (0, 0) -> (-25.4, 0) construction
  line L1 (0, 0) -> (25.4, 0) construction
  line L2 (-25.4, 0) -> (-28.575, 0)
  line L3 (-28.575, 0) -> (-28.575, 38.1)
  line L4 (-28.575, 38.1) -> (-25.4, 38.1)
  line L5 (-25.4, 38.1) -> (-25.4, 0)
  point P0 (-228.6, 0)
  dimension "d86" = 25.4
  dimension "d87" = 180
  dimension "d88" = 3.175
  dimension "d89" = 38.1
extrude "Extrusion9" add sketch "Sketch10" along normal blind 127
properties part number "ShootingMech_Housing6"
